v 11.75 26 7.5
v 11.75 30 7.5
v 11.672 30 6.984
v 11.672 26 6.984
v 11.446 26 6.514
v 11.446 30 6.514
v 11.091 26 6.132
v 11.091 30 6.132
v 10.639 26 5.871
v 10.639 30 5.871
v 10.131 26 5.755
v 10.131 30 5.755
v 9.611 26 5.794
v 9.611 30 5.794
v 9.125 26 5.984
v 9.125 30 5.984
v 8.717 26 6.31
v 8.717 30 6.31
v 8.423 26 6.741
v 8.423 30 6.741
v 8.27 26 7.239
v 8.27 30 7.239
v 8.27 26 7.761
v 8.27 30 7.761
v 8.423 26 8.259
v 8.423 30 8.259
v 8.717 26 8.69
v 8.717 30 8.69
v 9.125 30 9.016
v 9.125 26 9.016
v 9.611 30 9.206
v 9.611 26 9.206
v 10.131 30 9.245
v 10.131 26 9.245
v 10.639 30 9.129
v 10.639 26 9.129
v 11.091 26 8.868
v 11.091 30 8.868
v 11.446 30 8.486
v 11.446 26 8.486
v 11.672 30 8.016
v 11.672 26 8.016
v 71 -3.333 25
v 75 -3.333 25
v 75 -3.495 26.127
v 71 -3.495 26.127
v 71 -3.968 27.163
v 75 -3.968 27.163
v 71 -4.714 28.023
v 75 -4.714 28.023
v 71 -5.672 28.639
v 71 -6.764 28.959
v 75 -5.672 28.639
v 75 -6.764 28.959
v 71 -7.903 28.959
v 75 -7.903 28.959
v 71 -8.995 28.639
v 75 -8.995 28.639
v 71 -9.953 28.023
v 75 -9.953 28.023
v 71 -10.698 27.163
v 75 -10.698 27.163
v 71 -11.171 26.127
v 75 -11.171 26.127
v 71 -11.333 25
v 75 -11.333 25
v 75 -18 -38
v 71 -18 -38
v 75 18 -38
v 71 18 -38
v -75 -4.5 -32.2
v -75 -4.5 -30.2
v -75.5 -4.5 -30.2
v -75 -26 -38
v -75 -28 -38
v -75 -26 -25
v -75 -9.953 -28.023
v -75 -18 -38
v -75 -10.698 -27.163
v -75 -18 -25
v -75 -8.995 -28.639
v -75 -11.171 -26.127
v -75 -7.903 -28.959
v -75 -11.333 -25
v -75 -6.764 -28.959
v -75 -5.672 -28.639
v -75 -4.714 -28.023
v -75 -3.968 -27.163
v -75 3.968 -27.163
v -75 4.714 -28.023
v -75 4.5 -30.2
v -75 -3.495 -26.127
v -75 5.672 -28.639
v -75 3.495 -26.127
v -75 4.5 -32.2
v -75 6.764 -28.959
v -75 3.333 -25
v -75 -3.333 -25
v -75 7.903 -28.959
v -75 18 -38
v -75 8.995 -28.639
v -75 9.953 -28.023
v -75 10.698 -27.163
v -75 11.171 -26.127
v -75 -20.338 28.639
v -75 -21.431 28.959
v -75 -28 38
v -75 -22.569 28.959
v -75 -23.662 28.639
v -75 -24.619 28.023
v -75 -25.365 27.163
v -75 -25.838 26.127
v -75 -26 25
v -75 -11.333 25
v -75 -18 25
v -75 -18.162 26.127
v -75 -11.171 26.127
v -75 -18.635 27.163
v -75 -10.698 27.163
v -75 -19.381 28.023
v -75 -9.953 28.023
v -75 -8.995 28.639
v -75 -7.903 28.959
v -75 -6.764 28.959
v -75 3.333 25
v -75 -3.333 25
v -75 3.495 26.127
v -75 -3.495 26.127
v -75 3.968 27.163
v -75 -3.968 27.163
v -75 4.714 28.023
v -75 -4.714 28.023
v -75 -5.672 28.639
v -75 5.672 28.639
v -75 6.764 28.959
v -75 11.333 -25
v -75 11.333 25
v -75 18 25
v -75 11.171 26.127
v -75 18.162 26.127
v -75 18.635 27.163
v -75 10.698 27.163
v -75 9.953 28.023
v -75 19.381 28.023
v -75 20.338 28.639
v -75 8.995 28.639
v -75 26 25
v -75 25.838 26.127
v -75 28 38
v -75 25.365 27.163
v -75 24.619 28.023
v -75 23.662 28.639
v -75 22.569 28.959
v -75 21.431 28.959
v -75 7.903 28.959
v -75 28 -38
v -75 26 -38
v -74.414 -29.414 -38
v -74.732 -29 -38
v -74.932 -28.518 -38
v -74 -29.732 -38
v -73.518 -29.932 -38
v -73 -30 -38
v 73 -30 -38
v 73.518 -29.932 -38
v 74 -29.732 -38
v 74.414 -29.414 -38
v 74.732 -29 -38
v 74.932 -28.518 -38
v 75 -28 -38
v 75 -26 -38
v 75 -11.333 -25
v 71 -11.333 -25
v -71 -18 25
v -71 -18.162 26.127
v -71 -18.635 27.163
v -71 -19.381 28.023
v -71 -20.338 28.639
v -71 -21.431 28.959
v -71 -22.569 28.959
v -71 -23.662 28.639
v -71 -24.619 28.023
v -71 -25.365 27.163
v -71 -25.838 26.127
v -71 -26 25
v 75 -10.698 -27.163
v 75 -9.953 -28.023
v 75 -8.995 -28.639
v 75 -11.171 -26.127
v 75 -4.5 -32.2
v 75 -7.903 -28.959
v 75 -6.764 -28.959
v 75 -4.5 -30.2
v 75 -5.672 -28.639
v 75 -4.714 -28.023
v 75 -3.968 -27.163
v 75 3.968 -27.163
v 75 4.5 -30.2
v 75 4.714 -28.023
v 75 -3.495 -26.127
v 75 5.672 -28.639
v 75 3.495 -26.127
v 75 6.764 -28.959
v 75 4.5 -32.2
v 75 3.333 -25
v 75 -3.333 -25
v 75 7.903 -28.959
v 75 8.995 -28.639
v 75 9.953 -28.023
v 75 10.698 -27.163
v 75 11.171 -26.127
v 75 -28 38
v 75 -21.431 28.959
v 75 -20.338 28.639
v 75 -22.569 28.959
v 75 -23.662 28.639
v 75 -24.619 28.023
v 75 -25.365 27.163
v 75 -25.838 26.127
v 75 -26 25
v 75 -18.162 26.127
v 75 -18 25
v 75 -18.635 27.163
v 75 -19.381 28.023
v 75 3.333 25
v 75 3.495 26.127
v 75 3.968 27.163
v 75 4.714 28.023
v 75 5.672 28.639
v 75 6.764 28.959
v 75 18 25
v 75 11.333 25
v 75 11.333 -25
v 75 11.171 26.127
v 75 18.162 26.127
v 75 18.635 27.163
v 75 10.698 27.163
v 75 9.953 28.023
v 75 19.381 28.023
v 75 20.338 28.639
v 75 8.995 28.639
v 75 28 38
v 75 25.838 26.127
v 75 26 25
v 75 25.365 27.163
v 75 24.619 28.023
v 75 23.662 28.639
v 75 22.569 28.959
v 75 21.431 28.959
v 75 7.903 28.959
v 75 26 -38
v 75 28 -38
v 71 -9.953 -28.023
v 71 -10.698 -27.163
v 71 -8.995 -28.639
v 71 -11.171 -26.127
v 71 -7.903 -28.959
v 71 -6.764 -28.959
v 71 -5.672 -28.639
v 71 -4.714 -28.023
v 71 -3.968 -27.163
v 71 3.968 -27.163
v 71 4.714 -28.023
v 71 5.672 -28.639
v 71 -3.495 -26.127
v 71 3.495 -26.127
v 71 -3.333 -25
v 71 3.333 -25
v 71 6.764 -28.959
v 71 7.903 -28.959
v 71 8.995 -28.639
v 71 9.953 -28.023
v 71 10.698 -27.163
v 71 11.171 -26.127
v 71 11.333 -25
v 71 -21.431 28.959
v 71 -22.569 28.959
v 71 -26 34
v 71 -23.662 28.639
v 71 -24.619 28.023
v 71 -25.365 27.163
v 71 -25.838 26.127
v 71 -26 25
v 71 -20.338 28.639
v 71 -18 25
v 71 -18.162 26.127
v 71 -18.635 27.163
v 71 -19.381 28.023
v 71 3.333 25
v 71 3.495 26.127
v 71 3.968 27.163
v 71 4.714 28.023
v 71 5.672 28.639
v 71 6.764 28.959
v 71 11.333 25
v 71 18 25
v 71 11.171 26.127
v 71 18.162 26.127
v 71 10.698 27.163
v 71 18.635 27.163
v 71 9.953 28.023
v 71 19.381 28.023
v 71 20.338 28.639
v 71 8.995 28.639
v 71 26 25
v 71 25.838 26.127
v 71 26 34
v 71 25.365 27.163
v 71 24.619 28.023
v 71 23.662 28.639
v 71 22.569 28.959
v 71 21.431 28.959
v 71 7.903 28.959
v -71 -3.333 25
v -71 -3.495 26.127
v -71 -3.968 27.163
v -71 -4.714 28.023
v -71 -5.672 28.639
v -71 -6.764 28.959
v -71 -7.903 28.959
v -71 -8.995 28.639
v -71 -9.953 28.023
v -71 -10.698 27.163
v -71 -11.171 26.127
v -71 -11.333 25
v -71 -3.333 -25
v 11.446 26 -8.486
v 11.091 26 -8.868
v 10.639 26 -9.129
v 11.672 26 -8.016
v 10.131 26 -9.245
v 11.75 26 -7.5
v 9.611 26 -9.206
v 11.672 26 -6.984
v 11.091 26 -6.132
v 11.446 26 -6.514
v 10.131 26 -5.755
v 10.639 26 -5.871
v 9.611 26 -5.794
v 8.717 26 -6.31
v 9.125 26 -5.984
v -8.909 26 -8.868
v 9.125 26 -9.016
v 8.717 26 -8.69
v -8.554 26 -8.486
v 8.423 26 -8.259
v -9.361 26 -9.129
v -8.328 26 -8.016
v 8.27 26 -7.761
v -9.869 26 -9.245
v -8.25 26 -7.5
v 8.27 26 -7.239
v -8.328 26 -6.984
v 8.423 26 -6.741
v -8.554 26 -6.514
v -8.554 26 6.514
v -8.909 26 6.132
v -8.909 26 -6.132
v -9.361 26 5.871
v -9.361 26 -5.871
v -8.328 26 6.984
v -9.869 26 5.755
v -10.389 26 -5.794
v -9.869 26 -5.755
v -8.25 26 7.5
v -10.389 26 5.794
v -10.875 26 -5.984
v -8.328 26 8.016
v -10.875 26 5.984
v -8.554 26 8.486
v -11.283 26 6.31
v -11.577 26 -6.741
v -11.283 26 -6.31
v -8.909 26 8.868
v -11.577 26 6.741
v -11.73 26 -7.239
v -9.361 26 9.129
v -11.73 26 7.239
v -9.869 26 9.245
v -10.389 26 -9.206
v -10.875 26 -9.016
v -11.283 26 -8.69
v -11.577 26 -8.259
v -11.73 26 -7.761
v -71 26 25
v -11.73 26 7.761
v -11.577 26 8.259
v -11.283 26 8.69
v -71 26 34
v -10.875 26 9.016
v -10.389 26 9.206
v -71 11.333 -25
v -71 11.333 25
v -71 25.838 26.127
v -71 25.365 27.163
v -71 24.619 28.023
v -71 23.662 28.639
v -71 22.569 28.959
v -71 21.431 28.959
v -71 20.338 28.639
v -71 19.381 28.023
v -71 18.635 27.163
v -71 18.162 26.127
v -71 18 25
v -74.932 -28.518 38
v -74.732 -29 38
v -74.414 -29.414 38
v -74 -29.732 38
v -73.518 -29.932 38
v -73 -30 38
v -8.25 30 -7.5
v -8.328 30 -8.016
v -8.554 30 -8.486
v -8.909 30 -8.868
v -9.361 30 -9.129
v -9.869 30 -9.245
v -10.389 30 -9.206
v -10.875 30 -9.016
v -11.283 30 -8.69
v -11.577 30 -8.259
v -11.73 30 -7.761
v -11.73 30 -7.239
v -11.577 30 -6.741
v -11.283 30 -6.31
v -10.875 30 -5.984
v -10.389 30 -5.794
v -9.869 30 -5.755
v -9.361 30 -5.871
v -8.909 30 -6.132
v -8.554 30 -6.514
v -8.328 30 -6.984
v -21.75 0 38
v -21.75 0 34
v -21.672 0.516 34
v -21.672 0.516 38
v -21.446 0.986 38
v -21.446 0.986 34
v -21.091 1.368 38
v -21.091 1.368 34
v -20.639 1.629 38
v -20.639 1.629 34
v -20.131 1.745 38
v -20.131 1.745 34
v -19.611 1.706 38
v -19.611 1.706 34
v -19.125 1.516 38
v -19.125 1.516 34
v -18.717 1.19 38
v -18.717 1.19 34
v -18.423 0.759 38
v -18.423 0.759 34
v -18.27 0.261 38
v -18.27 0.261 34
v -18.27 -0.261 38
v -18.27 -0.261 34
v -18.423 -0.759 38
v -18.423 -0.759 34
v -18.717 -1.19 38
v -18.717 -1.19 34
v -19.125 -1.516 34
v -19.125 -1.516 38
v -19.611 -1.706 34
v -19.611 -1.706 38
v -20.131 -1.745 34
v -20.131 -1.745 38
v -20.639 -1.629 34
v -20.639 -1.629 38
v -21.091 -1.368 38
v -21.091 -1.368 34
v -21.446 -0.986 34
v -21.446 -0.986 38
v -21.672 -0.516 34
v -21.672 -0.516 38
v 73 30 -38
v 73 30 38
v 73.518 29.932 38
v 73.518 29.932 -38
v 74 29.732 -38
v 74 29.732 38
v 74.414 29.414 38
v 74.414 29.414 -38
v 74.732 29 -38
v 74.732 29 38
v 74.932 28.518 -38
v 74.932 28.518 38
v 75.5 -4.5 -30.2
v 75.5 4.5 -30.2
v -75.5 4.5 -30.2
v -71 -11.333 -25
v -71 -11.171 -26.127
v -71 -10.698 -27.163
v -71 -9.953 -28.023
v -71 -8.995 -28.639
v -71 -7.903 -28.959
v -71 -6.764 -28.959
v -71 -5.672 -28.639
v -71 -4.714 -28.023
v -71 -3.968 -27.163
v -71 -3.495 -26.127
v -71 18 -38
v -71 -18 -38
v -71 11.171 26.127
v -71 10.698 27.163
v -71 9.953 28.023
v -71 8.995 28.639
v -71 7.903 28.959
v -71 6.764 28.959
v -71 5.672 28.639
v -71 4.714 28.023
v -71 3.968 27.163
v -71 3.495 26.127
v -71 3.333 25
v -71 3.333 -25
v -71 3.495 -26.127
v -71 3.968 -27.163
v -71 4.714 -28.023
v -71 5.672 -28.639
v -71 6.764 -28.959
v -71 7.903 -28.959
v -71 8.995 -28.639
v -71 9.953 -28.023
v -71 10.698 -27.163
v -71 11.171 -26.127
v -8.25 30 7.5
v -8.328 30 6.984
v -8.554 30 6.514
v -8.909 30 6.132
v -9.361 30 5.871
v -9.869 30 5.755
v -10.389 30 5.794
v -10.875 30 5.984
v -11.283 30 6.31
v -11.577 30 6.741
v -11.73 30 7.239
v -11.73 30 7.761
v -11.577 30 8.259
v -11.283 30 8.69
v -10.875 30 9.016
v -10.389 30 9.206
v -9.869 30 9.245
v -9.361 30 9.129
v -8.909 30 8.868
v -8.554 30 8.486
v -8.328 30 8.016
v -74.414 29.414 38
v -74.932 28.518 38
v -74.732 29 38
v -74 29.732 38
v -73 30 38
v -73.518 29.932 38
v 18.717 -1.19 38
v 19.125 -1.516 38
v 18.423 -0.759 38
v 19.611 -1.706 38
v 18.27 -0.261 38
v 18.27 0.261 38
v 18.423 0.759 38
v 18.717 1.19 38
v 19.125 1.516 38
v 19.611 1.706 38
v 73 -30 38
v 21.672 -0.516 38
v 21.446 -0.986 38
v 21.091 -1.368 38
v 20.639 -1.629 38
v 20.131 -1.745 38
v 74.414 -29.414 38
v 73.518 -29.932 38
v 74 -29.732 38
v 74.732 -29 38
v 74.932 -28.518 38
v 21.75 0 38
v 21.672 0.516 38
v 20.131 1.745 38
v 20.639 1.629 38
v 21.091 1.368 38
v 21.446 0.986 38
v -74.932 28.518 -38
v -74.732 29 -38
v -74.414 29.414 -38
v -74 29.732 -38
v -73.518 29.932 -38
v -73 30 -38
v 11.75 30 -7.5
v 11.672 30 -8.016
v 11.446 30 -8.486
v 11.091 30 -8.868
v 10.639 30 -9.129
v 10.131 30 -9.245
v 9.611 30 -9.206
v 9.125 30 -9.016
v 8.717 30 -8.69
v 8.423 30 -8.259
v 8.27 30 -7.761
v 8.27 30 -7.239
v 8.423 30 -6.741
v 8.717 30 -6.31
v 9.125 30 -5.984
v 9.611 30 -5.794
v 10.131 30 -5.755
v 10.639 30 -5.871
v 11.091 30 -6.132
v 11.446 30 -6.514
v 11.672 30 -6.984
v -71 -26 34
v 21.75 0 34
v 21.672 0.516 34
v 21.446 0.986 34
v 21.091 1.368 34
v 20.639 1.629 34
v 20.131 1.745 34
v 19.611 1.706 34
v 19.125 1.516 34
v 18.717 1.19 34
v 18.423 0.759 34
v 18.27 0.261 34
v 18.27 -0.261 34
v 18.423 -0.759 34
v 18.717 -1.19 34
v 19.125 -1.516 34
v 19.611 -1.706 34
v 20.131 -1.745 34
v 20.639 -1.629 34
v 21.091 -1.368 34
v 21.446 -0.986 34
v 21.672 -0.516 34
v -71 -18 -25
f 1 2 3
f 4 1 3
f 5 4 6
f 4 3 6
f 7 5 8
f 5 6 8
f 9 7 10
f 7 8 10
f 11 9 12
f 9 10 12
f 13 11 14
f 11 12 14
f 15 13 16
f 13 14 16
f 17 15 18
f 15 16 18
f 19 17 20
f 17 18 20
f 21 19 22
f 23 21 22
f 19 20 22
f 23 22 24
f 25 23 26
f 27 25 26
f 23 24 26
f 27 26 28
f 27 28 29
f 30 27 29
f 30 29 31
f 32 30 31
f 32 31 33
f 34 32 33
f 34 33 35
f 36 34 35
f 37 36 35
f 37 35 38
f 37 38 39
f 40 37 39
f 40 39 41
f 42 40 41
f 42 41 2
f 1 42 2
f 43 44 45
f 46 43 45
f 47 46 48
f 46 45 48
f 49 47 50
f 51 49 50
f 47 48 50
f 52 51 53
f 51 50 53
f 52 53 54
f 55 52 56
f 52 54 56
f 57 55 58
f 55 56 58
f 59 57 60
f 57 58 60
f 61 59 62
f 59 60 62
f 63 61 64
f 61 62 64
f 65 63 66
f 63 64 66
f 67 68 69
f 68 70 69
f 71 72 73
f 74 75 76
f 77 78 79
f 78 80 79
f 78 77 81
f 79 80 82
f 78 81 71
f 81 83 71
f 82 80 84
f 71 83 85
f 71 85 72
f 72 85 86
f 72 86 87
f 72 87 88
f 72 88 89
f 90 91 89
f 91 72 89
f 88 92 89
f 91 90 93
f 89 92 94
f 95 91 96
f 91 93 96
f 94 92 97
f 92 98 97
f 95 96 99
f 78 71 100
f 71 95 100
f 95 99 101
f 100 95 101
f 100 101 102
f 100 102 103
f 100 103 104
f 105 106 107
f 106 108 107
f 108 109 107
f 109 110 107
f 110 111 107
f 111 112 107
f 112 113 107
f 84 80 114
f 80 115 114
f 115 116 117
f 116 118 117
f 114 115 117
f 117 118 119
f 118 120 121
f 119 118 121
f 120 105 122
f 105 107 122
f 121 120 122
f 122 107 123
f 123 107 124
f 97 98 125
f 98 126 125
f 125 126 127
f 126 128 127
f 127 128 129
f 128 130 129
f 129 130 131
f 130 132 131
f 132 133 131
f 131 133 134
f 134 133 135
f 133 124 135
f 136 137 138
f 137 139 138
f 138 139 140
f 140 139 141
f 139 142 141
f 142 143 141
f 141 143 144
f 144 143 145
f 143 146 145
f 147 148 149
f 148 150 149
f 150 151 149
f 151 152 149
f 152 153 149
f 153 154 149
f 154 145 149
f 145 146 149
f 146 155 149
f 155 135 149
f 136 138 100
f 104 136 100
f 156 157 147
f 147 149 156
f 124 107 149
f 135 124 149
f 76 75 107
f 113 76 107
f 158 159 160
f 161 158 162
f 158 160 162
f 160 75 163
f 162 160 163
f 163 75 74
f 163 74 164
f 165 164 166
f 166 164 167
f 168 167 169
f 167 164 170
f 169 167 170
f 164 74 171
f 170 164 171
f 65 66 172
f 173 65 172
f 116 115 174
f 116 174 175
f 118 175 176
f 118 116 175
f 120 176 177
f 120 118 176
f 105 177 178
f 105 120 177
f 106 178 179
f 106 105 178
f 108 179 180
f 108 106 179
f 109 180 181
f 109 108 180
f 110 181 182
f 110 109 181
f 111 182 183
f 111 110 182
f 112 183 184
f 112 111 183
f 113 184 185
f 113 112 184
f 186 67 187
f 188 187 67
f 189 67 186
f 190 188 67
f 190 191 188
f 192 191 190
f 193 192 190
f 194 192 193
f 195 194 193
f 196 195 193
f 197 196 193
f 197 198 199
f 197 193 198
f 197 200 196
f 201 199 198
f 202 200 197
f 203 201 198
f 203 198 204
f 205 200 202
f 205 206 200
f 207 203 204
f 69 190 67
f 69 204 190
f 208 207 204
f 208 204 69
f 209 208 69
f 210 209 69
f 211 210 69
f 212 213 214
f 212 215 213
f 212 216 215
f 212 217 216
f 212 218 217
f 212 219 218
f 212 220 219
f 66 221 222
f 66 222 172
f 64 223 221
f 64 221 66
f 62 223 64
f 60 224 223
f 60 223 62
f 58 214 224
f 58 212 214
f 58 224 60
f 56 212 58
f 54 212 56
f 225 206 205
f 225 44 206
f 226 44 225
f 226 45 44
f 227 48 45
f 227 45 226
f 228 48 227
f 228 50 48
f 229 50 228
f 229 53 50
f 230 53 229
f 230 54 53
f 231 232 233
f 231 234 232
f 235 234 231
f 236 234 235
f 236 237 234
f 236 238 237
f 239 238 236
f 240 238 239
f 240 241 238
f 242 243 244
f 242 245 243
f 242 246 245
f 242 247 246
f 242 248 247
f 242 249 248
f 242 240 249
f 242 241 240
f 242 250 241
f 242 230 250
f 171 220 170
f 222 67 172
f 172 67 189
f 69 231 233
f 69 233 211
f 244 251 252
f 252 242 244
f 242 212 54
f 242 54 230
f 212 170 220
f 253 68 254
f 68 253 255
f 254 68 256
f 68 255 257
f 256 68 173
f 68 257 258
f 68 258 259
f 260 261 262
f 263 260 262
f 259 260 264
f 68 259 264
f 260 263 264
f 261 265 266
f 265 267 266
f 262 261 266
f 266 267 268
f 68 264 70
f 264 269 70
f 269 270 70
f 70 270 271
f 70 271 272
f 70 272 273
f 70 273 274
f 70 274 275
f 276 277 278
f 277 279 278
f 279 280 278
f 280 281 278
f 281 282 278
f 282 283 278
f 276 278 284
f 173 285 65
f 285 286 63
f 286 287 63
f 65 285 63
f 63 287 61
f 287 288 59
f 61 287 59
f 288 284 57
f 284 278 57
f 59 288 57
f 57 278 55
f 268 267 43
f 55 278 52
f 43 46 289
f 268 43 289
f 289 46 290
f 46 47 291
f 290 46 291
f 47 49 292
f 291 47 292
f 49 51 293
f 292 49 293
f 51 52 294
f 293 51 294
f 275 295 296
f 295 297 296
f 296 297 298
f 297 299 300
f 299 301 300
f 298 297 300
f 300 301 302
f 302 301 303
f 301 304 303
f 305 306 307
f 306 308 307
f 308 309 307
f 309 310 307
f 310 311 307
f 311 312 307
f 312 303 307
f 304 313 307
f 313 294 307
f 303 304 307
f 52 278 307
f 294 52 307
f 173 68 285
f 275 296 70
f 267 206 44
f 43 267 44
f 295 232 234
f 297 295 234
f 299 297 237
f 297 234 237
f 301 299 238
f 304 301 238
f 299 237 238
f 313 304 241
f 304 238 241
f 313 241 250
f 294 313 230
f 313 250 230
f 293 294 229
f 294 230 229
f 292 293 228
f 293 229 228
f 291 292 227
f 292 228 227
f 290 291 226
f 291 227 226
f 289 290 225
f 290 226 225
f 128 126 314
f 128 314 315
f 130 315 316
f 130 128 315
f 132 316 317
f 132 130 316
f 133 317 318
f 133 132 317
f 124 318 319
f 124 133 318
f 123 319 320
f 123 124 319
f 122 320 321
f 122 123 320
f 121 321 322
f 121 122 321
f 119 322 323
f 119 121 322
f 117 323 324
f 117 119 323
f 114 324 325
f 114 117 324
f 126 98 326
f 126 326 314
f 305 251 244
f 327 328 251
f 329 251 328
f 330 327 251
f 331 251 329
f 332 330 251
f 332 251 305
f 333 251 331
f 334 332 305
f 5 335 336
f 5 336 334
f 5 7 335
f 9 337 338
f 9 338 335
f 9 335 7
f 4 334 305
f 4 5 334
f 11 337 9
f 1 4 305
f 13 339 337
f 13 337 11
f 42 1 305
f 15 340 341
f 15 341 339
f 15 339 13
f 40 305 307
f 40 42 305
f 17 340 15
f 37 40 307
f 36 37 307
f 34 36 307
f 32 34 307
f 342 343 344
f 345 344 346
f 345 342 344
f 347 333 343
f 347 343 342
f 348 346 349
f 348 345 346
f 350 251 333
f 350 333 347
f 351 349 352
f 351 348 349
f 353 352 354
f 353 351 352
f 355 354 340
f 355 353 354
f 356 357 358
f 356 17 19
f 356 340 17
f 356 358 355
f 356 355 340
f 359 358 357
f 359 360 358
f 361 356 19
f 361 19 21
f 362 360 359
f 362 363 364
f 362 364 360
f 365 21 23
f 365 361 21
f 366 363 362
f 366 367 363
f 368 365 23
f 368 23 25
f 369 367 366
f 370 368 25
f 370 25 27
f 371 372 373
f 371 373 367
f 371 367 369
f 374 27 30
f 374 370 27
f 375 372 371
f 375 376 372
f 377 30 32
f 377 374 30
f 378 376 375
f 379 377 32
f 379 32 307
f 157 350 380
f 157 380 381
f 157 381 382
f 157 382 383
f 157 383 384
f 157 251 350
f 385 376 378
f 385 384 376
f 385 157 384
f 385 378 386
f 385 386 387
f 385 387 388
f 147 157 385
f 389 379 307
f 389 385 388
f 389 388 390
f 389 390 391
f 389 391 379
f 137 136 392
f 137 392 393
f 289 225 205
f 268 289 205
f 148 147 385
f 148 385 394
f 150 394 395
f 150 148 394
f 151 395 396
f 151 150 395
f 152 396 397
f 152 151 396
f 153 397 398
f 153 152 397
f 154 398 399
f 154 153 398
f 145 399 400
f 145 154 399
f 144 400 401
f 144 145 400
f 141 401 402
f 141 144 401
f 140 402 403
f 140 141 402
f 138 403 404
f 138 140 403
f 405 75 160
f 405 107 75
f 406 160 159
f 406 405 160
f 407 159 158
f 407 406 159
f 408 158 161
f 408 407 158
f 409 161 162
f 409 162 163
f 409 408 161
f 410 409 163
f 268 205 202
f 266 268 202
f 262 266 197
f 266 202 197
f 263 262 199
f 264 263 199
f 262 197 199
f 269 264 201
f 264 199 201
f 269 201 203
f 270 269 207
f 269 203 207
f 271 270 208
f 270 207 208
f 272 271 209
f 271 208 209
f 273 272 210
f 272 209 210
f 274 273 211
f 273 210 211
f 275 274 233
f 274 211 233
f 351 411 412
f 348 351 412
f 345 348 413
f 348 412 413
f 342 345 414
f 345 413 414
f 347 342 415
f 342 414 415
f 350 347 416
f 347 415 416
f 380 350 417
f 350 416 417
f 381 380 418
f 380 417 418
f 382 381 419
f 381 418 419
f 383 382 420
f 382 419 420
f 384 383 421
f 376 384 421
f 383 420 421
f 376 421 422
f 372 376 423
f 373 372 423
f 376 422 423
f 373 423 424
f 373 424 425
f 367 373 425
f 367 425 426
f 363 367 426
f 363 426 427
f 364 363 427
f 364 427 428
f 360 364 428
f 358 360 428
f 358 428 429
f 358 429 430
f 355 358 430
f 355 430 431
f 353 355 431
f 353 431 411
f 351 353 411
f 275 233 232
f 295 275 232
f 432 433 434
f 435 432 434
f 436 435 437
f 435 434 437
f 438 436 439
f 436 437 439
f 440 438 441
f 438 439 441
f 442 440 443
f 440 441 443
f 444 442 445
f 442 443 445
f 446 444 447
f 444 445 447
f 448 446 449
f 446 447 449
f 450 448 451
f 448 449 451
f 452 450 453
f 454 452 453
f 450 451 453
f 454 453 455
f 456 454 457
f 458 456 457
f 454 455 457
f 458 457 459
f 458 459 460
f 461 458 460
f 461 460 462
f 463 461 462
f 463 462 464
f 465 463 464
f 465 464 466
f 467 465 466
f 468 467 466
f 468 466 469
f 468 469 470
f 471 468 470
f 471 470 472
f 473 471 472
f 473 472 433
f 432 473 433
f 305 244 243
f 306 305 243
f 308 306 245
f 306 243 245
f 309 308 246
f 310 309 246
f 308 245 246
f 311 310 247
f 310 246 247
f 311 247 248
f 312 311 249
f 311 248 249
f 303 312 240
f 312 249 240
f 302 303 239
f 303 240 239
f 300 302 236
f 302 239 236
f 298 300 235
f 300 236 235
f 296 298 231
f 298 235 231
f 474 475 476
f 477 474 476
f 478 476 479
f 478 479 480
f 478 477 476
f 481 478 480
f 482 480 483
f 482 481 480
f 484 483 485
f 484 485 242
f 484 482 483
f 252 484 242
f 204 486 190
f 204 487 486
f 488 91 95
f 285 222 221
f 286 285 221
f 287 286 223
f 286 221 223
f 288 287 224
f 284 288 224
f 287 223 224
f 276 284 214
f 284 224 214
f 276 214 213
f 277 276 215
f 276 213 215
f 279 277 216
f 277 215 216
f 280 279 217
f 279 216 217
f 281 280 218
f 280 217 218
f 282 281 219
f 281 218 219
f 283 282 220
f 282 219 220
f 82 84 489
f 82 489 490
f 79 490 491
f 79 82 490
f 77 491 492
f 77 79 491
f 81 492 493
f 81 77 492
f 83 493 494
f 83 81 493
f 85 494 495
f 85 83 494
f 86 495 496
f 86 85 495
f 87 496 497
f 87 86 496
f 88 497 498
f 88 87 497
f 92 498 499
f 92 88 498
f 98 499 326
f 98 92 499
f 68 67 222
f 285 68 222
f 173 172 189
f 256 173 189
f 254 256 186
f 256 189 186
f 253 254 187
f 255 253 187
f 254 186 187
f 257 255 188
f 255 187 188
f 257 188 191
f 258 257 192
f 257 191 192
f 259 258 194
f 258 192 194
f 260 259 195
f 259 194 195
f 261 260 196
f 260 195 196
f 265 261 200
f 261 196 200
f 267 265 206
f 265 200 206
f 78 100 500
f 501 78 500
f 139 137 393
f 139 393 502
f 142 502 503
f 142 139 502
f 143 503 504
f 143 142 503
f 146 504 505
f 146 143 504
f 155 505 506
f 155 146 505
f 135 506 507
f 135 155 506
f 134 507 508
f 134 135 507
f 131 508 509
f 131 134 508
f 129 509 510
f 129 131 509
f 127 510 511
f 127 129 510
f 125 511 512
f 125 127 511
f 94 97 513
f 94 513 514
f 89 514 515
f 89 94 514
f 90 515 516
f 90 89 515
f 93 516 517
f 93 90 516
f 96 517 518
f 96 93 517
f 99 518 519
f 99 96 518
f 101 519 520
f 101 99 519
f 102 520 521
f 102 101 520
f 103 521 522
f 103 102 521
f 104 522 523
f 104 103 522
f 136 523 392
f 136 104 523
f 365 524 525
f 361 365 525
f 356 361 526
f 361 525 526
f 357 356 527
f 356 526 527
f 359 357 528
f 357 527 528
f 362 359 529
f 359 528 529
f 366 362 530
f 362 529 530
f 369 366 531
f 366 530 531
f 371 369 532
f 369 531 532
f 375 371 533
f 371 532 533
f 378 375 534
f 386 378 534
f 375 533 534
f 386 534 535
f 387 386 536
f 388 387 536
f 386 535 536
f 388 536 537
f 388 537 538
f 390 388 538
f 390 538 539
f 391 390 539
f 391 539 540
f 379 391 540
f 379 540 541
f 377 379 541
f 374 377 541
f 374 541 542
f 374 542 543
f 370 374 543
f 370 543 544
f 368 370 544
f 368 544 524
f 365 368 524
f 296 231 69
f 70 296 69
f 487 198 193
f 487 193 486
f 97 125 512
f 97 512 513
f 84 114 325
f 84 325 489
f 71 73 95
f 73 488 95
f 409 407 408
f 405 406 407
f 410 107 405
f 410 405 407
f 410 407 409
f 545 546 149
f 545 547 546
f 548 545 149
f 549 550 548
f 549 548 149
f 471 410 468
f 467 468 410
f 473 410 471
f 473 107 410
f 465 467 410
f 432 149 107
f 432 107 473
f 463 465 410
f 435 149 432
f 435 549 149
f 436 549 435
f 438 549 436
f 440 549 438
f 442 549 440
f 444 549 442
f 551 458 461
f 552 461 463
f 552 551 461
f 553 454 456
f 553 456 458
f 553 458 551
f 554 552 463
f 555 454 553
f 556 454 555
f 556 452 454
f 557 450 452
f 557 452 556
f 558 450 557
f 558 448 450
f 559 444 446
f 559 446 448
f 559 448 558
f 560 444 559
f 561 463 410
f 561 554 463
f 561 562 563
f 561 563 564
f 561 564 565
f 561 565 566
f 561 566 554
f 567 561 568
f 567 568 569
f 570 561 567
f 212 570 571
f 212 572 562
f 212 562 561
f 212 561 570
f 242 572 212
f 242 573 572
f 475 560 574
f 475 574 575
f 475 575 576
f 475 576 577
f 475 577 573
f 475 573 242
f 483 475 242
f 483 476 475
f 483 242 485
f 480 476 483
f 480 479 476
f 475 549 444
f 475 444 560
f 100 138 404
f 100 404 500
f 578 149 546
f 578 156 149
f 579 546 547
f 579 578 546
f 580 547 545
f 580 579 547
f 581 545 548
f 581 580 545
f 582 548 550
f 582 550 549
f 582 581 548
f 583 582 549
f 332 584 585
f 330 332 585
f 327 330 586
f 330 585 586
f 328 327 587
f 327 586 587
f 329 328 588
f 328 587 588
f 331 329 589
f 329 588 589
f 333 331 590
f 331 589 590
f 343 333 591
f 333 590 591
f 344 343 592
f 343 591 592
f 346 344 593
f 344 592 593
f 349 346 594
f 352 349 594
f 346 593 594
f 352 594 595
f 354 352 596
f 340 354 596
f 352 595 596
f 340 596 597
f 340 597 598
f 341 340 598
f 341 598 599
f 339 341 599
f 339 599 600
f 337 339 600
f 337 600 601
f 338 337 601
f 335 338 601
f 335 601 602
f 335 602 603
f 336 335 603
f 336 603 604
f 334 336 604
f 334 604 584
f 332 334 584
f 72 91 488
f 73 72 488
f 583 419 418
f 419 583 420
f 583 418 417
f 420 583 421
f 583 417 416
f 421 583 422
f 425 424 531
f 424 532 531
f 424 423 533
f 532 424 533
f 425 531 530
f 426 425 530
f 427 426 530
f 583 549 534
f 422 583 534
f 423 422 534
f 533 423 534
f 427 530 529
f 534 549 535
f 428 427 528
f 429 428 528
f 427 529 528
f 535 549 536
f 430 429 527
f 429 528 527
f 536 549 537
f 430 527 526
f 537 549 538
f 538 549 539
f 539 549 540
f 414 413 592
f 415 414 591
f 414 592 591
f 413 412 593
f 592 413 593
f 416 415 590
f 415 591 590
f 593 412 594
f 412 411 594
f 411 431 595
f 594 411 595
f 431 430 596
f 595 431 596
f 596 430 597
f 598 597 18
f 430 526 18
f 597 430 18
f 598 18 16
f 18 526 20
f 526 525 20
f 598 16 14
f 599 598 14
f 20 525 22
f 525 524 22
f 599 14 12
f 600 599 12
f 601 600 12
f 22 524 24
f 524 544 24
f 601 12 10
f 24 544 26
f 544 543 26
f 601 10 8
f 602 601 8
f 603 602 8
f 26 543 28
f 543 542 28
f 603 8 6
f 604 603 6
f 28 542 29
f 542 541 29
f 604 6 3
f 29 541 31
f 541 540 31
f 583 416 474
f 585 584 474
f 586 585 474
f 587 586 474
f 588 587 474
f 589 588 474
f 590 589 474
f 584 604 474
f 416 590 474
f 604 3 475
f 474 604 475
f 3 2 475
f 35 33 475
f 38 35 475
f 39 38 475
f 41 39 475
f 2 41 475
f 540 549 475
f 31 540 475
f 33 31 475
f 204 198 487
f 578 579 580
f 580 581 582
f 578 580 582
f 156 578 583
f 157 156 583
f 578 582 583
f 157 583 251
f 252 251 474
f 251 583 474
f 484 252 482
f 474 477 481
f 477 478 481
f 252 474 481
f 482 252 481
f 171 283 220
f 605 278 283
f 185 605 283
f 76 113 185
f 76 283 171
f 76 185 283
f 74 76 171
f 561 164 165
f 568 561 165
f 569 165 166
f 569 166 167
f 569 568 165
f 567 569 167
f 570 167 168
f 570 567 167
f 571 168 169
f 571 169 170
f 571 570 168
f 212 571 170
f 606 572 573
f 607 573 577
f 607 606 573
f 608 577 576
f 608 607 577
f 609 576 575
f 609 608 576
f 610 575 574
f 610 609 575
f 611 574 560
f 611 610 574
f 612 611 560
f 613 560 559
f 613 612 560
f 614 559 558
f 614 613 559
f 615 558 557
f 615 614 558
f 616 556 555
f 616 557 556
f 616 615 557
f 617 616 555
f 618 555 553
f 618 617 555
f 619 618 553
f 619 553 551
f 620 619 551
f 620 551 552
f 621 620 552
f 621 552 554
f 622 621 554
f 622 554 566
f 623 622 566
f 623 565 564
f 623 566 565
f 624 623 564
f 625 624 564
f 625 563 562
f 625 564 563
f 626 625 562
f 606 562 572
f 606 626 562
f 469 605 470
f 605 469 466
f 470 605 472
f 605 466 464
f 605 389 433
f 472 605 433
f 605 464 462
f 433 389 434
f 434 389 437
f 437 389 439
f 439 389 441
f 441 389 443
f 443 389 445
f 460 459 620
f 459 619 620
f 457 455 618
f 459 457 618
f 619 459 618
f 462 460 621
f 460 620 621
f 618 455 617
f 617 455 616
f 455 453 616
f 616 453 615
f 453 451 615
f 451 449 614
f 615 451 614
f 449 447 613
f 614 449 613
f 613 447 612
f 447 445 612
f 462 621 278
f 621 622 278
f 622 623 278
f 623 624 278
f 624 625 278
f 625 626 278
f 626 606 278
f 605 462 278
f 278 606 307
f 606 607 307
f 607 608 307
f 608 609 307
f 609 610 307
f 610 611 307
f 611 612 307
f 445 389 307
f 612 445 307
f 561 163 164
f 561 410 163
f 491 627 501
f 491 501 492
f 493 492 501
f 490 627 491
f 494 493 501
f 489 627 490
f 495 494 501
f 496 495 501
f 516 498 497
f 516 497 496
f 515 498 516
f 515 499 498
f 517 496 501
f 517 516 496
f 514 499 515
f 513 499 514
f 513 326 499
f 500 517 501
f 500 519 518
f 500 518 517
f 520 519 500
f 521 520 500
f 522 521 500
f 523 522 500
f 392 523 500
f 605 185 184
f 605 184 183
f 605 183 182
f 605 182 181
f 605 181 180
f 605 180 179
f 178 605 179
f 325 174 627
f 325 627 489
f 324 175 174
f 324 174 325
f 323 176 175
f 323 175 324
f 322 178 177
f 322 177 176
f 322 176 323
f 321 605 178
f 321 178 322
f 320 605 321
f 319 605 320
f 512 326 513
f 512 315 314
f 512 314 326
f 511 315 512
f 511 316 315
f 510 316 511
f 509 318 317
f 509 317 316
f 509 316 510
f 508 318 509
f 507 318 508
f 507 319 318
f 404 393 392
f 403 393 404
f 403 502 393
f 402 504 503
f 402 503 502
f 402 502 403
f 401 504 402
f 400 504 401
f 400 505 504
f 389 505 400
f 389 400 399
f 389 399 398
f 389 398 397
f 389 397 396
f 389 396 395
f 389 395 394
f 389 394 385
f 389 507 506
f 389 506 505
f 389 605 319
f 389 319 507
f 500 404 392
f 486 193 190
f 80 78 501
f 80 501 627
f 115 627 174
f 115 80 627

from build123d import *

# Parameters (mm, degrees)
SCHIZZO1_W                   = 150
SCHIZZO1_H                   = 60
ESTRUSIONE_ESTRUSIONE1_DEPTH = 38
SVUOTA1_T                    = -4
SCHIZZO2_R                   = 1.75
TAGLIO_ESTRUSIONE1_DEPTH     = 10
SCHIZZO4_R                   = 1.75
TAGLIO_ESTRUSIONE2_DEPTH     = 10
RIPETIZIONE_A_L1_COUNT       = 2
RIPETIZIONE_A_L1_PITCH       = 15
RIPETIZIONE_A_L1_COUNT_DIR2  = 2
RIPETIZIONE_A_L1_PITCH_DIR2  = 20
TAGLIO_ESTRUSIONE3_DEPTH     = 10
RIPETIZIONE_A_L2_COUNT       = 4
RIPETIZIONE_A_L2_PITCH       = 14.666666667
SCHIZZO6_W                   = 14.123548546
SCHIZZO6_H                   = 8
TAGLIO_ESTRUSIONE4_DEPTH     = 10
SPECCHIA2_COPY_1_SKETCH_W    = 14.123548546
SPECCHIA2_COPY_1_SKETCH_H    = 8
SPECCHIA2_COPY_1_DEPTH       = 10
SPECCHIA2_COPY_2_DEPTH       = 10
SPECCHIA2_COPY_3_DEPTH       = 10
SPECCHIA2_COPY_4_DEPTH       = 10
SPECCHIA2_COPY_5_DEPTH       = 10
ESTRUSIONE_ESTRUSIONE3_DEPTH = 4.5
RACCORDO3_R                  = 2


with BuildPart() as part:
    # Schizzo1 → Estrusione-Estrusione1 (new body, symmetric)
    with BuildSketch(Plane.XY):
        Rectangle(SCHIZZO1_W, SCHIZZO1_H)
    extrude(amount=ESTRUSIONE_ESTRUSIONE1_DEPTH, both=True)

    # Svuota1
    svuota1_openings = [part.faces().sort_by_distance(p)[0] for p in [
        (0, 0, -38),
    ]]
    offset(amount=SVUOTA1_T, openings=svuota1_openings, kind=Kind.INTERSECTION)

    # Schizzo2 → Taglio-Estrusione1 (cut)
    with BuildSketch(Plane(origin=(0, 0, 34), x_dir=(-1, 0, 0), z_dir=(0, 0, -1))):
        with Locations((20, 0)):
            Circle(SCHIZZO2_R)
    taglio_estrusione1 = extrude(amount=-TAGLIO_ESTRUSIONE1_DEPTH, mode=Mode.SUBTRACT)

    # Specchia1: Taglio-Estrusione1 across plane
    add(taglio_estrusione1.mirror(Plane(origin=(0, 0, 0), x_dir=(0, 0, 1), z_dir=(1, 0, 0))), mode=Mode.SUBTRACT)

    # Schizzo4 → Taglio-Estrusione2 (cut)
    with BuildSketch(Plane(origin=(0, 30, 0), x_dir=(1, 0, 0), z_dir=(0, 1, 0))):
        with Locations((10, 7.5)):
            Circle(SCHIZZO4_R)
    taglio_estrusione2 = extrude(amount=-TAGLIO_ESTRUSIONE2_DEPTH, mode=Mode.SUBTRACT)

    # Ripetizione a L1: Taglio-Estrusione2 2 × 2
    with Locations(*[(-j * RIPETIZIONE_A_L1_PITCH_DIR2, 0, i * RIPETIZIONE_A_L1_PITCH) for i in range(RIPETIZIONE_A_L1_COUNT) for j in range(RIPETIZIONE_A_L1_COUNT_DIR2) if (i, j) != (0, 0)]):
        add(taglio_estrusione2, mode=Mode.SUBTRACT)

    # Schizzo5 → Taglio-Estrusione3 (cut)
    with BuildSketch(Plane.ZY.offset(75)):
        with BuildLine():
            Line((-25, 26), (25, 26))
            ThreePointArc((25, 26), (29, 22), (25, 18))
            Line((25, 18), (-25, 18))
            ThreePointArc((-25, 18), (-29, 22), (-25, 26))
        make_face()
    taglio_estrusione3 = extrude(amount=-TAGLIO_ESTRUSIONE3_DEPTH, mode=Mode.SUBTRACT)

    # Ripetizione a L2: Taglio-Estrusione3 ×4
    with Locations(*[(0, -i * RIPETIZIONE_A_L2_PITCH, 0) for i in range(1, RIPETIZIONE_A_L2_COUNT)]):
        add(taglio_estrusione3, mode=Mode.SUBTRACT)

    # Schizzo6 → Taglio-Estrusione4 (cut)
    with BuildSketch(Plane.ZY.offset(75)):
        with Locations((-30.938225727, -22)):
            Rectangle(SCHIZZO6_W, SCHIZZO6_H)
    taglio_estrusione4 = extrude(amount=-TAGLIO_ESTRUSIONE4_DEPTH, mode=Mode.SUBTRACT)

    # Specchia3: Taglio-Estrusione4 across plane
    add(taglio_estrusione4.mirror(Plane.ZX), mode=Mode.SUBTRACT)

    # Specchia2: Taglio-Estrusione4 across plane
    add(taglio_estrusione4.mirror(Plane(origin=(0, 0, 0), x_dir=(0, 0, 1), z_dir=(1, 0, 0))), mode=Mode.SUBTRACT)

    # Specchia2 copy 1 sketch → Specchia2 copy 1 (cut)
    with BuildSketch(Plane(origin=(75, 0, 0), x_dir=(0, 0, 1), z_dir=(1, 0, 0))):
        with Locations((-30.938225727, -22)):
            Rectangle(SPECCHIA2_COPY_1_SKETCH_W, SPECCHIA2_COPY_1_SKETCH_H)
    extrude(amount=-SPECCHIA2_COPY_1_DEPTH, mode=Mode.SUBTRACT)

    # Specchia2 copy 2 sketch → Specchia2 copy 2 (cut)
    with BuildSketch(Plane(origin=(75, -14.666666667, 0), x_dir=(0, 0, 1), z_dir=(1, 0, 0))):
        with BuildLine():
            Line((-25, -26), (25, -26))
            ThreePointArc((25, -26), (29, -22), (25, -18))
            Line((25, -18), (-25, -18))
            ThreePointArc((-25, -18), (-29, -22), (-25, -26))
        make_face()
    extrude(amount=-SPECCHIA2_COPY_2_DEPTH, mode=Mode.SUBTRACT)

    # Specchia2 copy 3 sketch → Specchia2 copy 3 (cut)
    with BuildSketch(Plane(origin=(75, -29.333333333, 0), x_dir=(0, 0, 1), z_dir=(1, 0, 0))):
        with BuildLine():
            Line((-25, -26), (25, -26))
            ThreePointArc((25, -26), (29, -22), (25, -18))
            Line((25, -18), (-25, -18))
            ThreePointArc((-25, -18), (-29, -22), (-25, -26))
        make_face()
    extrude(amount=-SPECCHIA2_COPY_3_DEPTH, mode=Mode.SUBTRACT)

    # Specchia2 copy 4 sketch → Specchia2 copy 4 (cut)
    with BuildSketch(Plane(origin=(75, -44, 0), x_dir=(0, 0, 1), z_dir=(1, 0, 0))):
        with BuildLine():
            Line((-25, -26), (25, -26))
            ThreePointArc((25, -26), (29, -22), (25, -18))
            Line((25, -18), (-25, -18))
            ThreePointArc((-25, -18), (-29, -22), (-25, -26))
        make_face()
    extrude(amount=-SPECCHIA2_COPY_4_DEPTH, mode=Mode.SUBTRACT)

    # Specchia2 copy 5 sketch → Specchia2 copy 5 (cut)
    with BuildSketch(Plane(origin=(75, 0, 0), x_dir=(0, 0, 1), z_dir=(1, 0, 0))):
        with BuildLine():
            Line((-25, -26), (25, -26))
            ThreePointArc((25, -26), (29, -22), (25, -18))
            Line((25, -18), (-25, -18))
            ThreePointArc((-25, -18), (-29, -22), (-25, -26))
        make_face()
    extrude(amount=-SPECCHIA2_COPY_5_DEPTH, mode=Mode.SUBTRACT)

    # Schizzo9 → Estrusione-Estrusione3 (add, symmetric)
    with BuildSketch(Plane(origin=(0, 0, 0), x_dir=(1, 0, 0), z_dir=(0, 1, 0))):
        Polygon((-75, 30.2), (-75.5, 30.2), (-75, 32.2), align=None)
    estrusione_estrusione3 = extrude(amount=ESTRUSIONE_ESTRUSIONE3_DEPTH, both=True)

    # Specchia11: Estrusione-Estrusione3 across plane
    add(estrusione_estrusione3.mirror(Plane(origin=(0, 0, 0), x_dir=(0, 0, 1), z_dir=(1, 0, 0))))

    # Raccordo3
    raccordo3_edges = [part.edges().sort_by_distance(p)[0] for p in [
        (75, -30, 0),
        (-75, -30, 0),
        (-75, 30, 0),
        (75, 30, 0),
    ]]
    fillet(raccordo3_edges, radius=RACCORDO3_R)


solid = part.part
